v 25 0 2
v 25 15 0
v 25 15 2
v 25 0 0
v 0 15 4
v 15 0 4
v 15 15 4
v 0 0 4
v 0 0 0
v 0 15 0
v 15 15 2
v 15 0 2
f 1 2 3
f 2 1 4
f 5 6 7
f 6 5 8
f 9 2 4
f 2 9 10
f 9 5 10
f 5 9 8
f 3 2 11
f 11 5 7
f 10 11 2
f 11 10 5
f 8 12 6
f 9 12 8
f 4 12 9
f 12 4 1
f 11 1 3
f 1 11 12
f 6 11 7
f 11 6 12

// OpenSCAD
largeur=15;
ep=4;
longueur=25;

module support_endstop_x(){
	difference(){
		cube([longueur,largeur,ep]);
		translate([15,-5,ep/2]){cube([longueur,largeur+10,ep*2]);}
	}
}

support_endstop_x();
